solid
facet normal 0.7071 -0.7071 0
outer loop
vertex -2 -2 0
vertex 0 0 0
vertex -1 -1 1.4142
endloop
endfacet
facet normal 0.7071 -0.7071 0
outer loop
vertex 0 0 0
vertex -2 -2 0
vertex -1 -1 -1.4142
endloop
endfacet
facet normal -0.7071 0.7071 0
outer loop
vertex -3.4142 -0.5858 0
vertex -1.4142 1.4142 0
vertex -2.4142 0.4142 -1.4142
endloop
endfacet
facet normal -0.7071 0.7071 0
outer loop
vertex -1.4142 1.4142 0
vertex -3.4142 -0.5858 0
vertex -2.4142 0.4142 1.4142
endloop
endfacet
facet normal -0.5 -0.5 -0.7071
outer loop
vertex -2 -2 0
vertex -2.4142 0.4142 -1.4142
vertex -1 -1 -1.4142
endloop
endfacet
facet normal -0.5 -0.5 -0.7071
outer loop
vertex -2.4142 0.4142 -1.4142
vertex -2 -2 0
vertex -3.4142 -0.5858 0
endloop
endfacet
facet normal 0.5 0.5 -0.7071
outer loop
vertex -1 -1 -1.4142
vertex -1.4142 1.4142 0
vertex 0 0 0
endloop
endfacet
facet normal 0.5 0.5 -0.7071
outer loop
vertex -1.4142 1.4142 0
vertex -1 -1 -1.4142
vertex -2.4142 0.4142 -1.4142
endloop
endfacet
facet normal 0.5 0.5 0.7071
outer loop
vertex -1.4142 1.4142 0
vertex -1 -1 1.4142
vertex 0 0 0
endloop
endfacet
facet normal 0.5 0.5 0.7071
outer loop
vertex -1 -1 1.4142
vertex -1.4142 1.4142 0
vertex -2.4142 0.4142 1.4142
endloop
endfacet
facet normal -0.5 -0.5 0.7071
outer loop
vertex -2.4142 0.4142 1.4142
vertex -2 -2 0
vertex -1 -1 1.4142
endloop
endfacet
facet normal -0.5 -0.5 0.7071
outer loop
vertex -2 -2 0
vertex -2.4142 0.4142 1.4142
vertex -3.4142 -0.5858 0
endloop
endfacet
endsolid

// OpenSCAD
$fn=7;
translate([-3.4142134,-0.5857866,-0.00000023841858])
{
	rotate(90,[0.7071068,0.7071068,0])
	{
		cube([2,2,2]);
	}
}
